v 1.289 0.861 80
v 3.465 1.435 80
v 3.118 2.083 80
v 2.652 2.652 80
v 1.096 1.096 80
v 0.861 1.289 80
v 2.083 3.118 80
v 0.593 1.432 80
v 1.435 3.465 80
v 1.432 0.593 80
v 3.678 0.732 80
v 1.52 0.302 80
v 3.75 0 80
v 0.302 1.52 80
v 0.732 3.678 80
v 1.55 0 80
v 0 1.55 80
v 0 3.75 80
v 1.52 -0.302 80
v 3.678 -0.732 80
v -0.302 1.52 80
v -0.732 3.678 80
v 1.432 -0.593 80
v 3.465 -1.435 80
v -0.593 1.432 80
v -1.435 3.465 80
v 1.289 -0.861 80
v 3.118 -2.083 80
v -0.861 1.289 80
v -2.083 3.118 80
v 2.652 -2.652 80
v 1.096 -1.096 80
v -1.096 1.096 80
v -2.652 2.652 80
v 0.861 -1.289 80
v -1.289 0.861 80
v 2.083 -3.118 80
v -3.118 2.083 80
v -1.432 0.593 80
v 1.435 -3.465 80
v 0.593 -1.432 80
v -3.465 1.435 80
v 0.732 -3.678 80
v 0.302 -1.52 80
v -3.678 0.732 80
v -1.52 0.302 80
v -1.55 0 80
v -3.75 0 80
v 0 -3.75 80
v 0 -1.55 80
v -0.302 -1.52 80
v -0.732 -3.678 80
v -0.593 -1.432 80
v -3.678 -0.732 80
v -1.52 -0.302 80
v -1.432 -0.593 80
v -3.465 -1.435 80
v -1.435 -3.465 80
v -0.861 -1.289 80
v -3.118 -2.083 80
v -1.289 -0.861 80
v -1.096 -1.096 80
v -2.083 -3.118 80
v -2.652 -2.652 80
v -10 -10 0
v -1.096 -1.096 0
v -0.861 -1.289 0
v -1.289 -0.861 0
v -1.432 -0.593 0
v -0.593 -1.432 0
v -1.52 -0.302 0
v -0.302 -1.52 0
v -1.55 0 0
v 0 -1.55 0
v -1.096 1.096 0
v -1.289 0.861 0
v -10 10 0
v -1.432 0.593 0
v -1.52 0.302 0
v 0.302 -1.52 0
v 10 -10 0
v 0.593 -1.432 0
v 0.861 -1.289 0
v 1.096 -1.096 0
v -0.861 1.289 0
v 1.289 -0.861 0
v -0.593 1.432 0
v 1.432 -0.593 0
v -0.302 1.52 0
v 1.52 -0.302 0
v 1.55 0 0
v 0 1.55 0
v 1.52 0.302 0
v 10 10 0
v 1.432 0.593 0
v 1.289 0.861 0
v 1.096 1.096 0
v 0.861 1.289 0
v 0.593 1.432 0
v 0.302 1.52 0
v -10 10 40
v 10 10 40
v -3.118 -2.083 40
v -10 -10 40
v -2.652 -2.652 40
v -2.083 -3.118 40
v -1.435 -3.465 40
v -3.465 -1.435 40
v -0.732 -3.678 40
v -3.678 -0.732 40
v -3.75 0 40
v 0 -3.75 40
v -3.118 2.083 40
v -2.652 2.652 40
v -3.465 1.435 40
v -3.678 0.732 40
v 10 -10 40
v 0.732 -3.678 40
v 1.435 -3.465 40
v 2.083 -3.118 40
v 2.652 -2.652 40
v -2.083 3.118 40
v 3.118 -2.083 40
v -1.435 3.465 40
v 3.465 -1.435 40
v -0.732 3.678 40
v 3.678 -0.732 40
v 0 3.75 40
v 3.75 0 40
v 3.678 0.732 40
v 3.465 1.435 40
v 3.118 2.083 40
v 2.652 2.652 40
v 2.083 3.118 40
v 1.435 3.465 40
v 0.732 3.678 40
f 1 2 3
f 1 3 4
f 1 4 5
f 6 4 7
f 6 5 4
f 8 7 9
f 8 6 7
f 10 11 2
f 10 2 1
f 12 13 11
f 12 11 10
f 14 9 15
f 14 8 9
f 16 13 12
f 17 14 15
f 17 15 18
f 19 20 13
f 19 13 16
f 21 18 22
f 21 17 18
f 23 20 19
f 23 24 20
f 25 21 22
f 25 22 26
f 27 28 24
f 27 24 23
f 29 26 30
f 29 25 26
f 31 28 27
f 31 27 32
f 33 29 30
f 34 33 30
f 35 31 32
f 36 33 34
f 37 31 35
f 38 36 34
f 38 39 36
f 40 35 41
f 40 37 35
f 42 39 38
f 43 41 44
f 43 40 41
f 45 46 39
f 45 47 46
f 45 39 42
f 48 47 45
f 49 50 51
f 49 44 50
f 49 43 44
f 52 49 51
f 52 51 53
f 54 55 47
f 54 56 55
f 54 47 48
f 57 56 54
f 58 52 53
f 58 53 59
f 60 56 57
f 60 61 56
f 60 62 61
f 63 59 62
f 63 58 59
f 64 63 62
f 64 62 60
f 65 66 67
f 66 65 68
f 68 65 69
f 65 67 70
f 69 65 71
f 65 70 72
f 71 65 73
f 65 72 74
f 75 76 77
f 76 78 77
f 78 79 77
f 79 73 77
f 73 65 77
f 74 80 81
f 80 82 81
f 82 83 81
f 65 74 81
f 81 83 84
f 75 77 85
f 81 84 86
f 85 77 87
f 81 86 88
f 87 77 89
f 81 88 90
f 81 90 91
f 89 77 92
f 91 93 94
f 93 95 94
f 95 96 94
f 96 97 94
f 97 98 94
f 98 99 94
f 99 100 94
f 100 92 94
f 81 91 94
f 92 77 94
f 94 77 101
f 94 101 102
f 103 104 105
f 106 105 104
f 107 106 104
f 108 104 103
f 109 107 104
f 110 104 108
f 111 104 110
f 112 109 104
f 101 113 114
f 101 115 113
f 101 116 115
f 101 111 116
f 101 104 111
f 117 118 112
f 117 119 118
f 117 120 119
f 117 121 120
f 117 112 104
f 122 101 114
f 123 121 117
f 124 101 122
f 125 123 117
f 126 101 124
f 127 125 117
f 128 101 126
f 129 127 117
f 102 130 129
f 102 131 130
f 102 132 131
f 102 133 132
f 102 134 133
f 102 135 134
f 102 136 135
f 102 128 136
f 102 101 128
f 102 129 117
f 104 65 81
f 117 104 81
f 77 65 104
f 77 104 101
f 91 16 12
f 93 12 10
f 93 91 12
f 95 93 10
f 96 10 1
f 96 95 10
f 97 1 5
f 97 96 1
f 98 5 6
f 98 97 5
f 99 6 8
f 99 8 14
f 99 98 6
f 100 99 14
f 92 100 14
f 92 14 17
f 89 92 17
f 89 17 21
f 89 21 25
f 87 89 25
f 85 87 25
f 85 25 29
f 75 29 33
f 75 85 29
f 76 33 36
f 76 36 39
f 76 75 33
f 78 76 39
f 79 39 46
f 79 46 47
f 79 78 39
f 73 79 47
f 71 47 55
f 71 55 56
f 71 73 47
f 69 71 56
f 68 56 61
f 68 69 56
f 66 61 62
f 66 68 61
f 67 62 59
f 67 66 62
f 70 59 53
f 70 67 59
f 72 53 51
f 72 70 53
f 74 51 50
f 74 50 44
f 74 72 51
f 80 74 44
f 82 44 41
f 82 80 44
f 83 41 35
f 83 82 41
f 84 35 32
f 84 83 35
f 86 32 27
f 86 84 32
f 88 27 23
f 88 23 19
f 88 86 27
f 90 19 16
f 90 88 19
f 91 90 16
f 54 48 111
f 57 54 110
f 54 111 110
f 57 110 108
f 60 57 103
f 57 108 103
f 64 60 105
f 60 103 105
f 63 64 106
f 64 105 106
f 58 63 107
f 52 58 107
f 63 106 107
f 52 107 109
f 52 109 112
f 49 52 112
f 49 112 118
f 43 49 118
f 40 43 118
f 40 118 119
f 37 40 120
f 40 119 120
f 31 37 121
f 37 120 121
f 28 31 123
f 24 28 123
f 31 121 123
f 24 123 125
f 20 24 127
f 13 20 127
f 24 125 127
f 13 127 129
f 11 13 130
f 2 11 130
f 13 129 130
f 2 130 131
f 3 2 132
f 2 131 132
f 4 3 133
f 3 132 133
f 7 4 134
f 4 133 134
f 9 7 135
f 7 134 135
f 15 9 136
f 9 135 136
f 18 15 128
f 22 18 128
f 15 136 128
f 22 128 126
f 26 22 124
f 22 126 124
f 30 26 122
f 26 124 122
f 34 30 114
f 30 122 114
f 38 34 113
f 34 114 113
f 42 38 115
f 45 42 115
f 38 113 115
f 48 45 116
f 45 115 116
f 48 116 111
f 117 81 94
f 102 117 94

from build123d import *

# Parameters (mm, degrees)
SKETCH1_W           = 20
SKETCH1_H           = 20
SKETCH1_R           = 1.55
BOSS_EXTRUDE1_DEPTH = 40
SKETCH2_R           = 3.75
SKETCH2_R_2         = 1.55
BOSS_EXTRUDE2_DEPTH = 40


with BuildPart() as part:
    # Sketch1 → Boss-Extrude1 (new body)
    with BuildSketch(Plane.XY):
        Rectangle(SKETCH1_W, SKETCH1_H)
        Circle(SKETCH1_R, mode=Mode.SUBTRACT)
    extrude(amount=BOSS_EXTRUDE1_DEPTH)

    # Sketch2 → Boss-Extrude2 (add)
    with BuildSketch(Plane.XY.offset(40)):
        Circle(SKETCH2_R)
        Circle(SKETCH2_R_2, mode=Mode.SUBTRACT)
    extrude(amount=BOSS_EXTRUDE2_DEPTH)


solid = part.part
